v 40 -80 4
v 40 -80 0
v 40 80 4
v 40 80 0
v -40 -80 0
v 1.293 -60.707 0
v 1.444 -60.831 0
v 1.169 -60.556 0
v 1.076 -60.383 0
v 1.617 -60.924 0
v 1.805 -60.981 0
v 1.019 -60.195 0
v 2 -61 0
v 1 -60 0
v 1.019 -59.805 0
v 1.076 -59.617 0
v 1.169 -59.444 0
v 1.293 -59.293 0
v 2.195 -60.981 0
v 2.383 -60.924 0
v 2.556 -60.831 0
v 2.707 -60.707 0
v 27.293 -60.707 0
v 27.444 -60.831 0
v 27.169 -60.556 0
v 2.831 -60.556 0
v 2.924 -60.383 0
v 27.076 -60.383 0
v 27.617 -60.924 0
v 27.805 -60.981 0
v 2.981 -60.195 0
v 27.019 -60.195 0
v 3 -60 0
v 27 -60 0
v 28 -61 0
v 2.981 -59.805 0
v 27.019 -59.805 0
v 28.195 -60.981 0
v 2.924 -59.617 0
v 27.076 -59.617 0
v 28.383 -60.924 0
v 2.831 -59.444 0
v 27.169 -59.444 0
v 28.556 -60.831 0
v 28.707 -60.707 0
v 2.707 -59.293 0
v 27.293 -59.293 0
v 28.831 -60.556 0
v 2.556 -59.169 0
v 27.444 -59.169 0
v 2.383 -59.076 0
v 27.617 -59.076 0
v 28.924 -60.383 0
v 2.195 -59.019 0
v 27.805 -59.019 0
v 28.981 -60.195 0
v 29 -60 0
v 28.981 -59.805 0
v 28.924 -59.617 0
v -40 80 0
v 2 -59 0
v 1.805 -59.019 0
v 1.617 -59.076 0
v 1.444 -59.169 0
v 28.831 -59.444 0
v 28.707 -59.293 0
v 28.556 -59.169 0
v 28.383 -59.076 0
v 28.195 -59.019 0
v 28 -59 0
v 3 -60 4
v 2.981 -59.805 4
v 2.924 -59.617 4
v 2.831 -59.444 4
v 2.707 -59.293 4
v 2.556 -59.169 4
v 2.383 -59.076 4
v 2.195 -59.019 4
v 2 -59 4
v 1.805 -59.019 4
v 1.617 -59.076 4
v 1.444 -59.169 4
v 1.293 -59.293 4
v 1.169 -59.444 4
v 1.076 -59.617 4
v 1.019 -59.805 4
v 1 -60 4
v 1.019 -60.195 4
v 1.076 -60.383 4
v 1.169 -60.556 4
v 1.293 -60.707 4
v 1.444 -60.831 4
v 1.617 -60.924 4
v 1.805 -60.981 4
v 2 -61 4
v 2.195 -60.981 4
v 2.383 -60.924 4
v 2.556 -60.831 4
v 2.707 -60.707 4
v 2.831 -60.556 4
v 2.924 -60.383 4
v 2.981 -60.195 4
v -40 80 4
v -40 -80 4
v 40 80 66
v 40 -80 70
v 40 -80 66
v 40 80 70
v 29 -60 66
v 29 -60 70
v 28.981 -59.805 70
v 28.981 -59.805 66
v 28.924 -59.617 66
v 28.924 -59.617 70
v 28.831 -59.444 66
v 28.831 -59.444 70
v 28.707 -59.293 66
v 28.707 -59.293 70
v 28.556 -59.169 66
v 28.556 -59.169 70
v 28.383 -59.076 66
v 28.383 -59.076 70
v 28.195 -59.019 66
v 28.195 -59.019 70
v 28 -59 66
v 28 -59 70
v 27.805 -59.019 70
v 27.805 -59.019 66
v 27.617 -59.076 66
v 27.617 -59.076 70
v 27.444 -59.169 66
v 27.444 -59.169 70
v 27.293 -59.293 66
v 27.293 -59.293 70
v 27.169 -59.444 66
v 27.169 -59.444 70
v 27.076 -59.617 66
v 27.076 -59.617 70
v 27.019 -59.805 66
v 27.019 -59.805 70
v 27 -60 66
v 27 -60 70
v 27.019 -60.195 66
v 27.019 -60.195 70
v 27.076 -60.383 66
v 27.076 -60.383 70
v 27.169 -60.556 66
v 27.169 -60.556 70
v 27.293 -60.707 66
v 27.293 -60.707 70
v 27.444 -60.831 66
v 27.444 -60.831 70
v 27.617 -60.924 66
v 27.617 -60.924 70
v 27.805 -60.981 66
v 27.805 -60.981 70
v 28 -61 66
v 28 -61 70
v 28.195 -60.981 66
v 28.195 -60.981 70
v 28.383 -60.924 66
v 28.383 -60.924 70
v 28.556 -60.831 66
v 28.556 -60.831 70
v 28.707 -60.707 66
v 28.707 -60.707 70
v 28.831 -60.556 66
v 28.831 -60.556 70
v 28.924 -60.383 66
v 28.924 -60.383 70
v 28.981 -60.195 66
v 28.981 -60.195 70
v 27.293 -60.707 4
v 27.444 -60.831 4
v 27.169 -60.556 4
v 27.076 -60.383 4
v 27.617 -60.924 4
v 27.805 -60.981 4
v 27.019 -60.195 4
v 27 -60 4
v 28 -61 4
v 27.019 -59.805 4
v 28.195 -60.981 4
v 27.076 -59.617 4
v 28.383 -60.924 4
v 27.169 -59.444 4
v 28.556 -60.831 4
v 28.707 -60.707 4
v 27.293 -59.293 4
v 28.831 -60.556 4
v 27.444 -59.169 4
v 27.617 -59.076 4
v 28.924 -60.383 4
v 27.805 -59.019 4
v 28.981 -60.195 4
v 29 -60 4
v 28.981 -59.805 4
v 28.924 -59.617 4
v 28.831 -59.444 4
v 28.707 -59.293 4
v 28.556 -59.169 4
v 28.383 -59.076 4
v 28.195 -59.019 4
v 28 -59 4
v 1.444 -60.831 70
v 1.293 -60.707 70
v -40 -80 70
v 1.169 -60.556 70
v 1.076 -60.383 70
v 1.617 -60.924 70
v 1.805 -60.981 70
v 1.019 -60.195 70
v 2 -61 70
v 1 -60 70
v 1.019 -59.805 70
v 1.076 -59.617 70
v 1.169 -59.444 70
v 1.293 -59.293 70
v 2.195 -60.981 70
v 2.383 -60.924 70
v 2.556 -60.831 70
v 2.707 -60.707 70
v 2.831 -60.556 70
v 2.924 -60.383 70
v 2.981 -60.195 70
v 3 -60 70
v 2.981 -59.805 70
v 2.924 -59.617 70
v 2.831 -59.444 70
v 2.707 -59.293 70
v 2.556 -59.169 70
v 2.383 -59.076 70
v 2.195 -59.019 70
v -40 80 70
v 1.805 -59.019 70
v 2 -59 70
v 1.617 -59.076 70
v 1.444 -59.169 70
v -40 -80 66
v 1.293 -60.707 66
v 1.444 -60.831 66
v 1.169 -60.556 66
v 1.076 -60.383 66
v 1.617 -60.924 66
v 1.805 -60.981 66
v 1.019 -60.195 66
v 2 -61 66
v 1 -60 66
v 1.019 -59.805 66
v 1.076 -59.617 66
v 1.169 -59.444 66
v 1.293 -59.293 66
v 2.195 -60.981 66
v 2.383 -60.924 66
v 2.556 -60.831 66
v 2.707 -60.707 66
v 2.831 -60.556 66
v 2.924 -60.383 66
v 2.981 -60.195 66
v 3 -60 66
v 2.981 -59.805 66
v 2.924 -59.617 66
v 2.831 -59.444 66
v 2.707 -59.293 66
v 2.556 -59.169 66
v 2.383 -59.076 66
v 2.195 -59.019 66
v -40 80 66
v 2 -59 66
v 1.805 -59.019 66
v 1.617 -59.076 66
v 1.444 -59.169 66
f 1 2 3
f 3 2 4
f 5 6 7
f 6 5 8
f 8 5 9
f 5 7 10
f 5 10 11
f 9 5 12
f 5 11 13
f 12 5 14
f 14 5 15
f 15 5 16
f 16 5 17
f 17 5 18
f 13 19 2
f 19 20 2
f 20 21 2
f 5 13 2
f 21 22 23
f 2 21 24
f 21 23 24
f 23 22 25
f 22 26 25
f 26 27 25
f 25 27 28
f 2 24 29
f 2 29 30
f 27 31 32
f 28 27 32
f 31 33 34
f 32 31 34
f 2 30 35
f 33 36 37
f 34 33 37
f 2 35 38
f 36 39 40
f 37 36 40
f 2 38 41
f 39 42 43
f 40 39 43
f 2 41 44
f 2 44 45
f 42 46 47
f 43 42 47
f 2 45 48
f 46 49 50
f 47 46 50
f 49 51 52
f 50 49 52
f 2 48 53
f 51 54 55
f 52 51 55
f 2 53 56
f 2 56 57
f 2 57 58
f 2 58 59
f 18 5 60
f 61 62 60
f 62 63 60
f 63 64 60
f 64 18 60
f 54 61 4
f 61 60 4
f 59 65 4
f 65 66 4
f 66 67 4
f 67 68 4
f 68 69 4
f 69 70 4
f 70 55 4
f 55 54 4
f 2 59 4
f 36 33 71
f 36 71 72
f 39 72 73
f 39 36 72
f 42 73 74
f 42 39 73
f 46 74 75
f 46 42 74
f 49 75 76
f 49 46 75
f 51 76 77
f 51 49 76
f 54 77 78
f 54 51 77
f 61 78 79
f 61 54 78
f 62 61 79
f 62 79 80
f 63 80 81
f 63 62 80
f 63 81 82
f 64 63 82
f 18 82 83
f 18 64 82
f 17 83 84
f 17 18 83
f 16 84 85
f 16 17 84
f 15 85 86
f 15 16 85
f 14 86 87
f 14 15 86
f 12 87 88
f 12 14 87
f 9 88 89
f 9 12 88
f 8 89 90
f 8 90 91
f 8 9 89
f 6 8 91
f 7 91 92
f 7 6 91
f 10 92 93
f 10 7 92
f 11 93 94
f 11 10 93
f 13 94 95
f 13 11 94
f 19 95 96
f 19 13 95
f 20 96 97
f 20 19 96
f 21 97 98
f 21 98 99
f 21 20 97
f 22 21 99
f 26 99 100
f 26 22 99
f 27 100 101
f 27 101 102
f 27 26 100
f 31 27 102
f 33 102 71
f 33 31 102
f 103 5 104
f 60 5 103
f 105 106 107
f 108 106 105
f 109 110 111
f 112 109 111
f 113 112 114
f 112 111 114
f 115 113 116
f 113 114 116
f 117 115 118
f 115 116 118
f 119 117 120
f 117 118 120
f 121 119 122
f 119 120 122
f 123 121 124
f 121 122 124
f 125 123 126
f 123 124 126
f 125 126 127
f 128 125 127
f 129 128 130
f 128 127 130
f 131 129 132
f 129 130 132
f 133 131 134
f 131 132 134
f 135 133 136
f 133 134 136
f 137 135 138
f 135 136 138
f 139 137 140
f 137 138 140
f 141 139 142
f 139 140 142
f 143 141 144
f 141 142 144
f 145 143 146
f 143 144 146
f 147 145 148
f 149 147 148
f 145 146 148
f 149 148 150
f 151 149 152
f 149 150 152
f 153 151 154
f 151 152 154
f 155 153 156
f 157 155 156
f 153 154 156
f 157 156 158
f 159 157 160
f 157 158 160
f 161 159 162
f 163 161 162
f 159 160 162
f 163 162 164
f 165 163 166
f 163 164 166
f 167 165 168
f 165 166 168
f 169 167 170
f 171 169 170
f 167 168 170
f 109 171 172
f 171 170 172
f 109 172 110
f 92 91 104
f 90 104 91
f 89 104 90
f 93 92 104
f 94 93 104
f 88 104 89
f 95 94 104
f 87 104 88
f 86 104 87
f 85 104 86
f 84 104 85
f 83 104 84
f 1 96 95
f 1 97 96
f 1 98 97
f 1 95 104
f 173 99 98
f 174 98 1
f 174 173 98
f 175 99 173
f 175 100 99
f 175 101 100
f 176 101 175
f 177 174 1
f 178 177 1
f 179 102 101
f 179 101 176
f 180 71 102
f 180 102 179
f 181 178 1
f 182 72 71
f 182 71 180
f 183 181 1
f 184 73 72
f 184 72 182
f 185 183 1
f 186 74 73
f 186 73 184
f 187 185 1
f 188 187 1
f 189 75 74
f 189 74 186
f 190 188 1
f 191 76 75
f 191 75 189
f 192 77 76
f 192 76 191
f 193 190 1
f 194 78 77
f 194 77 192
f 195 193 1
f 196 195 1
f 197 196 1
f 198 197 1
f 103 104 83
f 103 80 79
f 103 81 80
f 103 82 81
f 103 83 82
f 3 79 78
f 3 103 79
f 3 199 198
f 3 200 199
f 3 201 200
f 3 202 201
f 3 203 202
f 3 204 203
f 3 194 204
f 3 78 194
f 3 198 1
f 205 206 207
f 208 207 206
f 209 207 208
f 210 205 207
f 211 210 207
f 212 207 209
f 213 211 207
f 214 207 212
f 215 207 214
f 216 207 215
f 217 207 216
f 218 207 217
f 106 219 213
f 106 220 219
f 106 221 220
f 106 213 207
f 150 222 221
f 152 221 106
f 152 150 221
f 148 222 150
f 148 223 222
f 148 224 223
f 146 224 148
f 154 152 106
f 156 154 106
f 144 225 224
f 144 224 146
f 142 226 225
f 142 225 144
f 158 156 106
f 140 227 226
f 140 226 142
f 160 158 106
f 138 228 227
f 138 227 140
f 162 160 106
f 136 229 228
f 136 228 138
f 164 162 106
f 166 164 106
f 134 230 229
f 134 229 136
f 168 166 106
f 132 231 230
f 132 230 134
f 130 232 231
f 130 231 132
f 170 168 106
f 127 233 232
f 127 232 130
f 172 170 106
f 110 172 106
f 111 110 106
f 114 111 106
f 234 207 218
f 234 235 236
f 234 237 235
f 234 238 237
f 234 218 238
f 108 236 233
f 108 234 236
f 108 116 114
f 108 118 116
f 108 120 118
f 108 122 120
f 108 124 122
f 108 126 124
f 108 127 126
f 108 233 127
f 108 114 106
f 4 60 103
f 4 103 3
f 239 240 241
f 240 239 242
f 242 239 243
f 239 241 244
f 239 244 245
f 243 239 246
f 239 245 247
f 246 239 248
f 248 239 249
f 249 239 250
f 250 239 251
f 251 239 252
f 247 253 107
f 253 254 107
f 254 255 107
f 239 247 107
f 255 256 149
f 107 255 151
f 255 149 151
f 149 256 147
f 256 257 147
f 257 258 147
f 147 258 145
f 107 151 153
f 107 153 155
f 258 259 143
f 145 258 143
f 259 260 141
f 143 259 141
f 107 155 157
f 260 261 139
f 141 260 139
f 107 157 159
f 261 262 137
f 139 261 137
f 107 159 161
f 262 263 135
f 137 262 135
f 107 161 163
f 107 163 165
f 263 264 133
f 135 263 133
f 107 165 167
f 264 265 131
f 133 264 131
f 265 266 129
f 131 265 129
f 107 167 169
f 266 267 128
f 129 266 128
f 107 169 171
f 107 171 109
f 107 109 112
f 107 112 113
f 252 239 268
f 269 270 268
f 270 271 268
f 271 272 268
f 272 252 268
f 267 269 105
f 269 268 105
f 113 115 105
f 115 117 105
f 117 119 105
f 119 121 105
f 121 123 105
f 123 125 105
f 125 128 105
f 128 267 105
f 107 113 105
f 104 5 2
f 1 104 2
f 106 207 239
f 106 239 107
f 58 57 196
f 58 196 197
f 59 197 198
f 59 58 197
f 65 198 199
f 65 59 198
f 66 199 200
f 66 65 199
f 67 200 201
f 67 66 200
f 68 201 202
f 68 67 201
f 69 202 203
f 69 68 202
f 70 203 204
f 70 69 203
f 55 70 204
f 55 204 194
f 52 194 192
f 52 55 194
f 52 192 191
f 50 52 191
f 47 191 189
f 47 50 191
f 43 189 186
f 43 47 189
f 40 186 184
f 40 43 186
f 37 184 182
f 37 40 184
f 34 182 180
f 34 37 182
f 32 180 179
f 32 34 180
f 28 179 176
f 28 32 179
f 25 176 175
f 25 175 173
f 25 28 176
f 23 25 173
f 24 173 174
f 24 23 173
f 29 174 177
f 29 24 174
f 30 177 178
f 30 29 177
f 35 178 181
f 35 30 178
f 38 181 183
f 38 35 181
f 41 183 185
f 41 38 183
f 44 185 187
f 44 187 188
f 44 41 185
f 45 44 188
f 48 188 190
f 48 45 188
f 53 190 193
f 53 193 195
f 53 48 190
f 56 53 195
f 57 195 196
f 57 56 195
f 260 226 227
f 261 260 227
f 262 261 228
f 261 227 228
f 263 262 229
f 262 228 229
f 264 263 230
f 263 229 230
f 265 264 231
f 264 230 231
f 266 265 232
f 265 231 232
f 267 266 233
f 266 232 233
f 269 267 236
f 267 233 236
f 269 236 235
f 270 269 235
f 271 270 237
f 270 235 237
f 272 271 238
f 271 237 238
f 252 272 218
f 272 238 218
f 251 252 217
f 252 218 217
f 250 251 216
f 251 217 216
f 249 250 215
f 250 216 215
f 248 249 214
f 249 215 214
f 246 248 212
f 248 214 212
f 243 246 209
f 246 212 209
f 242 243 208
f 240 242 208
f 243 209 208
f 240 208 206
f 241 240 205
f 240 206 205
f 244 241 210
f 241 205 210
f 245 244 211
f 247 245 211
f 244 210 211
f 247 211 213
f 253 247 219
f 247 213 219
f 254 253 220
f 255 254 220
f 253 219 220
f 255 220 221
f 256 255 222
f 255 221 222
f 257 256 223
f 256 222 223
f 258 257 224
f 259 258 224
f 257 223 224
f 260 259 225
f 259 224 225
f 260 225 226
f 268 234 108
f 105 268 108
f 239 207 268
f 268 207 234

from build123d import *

# Parameters (mm, degrees)
F0_W     = 80
F0_H     = 160
F0_R     = 1
F1_DEPTH = 4


with BuildPart() as f1:
    # F0 (on Top) → F1 (new body)
    with BuildSketch(Plane.XY):
        Rectangle(F0_W, F0_H)
        with Locations((2, -60)):
            Circle(F0_R, mode=Mode.SUBTRACT)
        with Locations((28, -60)):
            Circle(F0_R, mode=Mode.SUBTRACT)
    extrude(amount=F1_DEPTH)


with BuildPart() as f3_1:
    # F3: instance of F1
    add(f1.part.mirror(Plane.XY.offset(35)))


solid = Compound([f1.part, f3_1.part])
